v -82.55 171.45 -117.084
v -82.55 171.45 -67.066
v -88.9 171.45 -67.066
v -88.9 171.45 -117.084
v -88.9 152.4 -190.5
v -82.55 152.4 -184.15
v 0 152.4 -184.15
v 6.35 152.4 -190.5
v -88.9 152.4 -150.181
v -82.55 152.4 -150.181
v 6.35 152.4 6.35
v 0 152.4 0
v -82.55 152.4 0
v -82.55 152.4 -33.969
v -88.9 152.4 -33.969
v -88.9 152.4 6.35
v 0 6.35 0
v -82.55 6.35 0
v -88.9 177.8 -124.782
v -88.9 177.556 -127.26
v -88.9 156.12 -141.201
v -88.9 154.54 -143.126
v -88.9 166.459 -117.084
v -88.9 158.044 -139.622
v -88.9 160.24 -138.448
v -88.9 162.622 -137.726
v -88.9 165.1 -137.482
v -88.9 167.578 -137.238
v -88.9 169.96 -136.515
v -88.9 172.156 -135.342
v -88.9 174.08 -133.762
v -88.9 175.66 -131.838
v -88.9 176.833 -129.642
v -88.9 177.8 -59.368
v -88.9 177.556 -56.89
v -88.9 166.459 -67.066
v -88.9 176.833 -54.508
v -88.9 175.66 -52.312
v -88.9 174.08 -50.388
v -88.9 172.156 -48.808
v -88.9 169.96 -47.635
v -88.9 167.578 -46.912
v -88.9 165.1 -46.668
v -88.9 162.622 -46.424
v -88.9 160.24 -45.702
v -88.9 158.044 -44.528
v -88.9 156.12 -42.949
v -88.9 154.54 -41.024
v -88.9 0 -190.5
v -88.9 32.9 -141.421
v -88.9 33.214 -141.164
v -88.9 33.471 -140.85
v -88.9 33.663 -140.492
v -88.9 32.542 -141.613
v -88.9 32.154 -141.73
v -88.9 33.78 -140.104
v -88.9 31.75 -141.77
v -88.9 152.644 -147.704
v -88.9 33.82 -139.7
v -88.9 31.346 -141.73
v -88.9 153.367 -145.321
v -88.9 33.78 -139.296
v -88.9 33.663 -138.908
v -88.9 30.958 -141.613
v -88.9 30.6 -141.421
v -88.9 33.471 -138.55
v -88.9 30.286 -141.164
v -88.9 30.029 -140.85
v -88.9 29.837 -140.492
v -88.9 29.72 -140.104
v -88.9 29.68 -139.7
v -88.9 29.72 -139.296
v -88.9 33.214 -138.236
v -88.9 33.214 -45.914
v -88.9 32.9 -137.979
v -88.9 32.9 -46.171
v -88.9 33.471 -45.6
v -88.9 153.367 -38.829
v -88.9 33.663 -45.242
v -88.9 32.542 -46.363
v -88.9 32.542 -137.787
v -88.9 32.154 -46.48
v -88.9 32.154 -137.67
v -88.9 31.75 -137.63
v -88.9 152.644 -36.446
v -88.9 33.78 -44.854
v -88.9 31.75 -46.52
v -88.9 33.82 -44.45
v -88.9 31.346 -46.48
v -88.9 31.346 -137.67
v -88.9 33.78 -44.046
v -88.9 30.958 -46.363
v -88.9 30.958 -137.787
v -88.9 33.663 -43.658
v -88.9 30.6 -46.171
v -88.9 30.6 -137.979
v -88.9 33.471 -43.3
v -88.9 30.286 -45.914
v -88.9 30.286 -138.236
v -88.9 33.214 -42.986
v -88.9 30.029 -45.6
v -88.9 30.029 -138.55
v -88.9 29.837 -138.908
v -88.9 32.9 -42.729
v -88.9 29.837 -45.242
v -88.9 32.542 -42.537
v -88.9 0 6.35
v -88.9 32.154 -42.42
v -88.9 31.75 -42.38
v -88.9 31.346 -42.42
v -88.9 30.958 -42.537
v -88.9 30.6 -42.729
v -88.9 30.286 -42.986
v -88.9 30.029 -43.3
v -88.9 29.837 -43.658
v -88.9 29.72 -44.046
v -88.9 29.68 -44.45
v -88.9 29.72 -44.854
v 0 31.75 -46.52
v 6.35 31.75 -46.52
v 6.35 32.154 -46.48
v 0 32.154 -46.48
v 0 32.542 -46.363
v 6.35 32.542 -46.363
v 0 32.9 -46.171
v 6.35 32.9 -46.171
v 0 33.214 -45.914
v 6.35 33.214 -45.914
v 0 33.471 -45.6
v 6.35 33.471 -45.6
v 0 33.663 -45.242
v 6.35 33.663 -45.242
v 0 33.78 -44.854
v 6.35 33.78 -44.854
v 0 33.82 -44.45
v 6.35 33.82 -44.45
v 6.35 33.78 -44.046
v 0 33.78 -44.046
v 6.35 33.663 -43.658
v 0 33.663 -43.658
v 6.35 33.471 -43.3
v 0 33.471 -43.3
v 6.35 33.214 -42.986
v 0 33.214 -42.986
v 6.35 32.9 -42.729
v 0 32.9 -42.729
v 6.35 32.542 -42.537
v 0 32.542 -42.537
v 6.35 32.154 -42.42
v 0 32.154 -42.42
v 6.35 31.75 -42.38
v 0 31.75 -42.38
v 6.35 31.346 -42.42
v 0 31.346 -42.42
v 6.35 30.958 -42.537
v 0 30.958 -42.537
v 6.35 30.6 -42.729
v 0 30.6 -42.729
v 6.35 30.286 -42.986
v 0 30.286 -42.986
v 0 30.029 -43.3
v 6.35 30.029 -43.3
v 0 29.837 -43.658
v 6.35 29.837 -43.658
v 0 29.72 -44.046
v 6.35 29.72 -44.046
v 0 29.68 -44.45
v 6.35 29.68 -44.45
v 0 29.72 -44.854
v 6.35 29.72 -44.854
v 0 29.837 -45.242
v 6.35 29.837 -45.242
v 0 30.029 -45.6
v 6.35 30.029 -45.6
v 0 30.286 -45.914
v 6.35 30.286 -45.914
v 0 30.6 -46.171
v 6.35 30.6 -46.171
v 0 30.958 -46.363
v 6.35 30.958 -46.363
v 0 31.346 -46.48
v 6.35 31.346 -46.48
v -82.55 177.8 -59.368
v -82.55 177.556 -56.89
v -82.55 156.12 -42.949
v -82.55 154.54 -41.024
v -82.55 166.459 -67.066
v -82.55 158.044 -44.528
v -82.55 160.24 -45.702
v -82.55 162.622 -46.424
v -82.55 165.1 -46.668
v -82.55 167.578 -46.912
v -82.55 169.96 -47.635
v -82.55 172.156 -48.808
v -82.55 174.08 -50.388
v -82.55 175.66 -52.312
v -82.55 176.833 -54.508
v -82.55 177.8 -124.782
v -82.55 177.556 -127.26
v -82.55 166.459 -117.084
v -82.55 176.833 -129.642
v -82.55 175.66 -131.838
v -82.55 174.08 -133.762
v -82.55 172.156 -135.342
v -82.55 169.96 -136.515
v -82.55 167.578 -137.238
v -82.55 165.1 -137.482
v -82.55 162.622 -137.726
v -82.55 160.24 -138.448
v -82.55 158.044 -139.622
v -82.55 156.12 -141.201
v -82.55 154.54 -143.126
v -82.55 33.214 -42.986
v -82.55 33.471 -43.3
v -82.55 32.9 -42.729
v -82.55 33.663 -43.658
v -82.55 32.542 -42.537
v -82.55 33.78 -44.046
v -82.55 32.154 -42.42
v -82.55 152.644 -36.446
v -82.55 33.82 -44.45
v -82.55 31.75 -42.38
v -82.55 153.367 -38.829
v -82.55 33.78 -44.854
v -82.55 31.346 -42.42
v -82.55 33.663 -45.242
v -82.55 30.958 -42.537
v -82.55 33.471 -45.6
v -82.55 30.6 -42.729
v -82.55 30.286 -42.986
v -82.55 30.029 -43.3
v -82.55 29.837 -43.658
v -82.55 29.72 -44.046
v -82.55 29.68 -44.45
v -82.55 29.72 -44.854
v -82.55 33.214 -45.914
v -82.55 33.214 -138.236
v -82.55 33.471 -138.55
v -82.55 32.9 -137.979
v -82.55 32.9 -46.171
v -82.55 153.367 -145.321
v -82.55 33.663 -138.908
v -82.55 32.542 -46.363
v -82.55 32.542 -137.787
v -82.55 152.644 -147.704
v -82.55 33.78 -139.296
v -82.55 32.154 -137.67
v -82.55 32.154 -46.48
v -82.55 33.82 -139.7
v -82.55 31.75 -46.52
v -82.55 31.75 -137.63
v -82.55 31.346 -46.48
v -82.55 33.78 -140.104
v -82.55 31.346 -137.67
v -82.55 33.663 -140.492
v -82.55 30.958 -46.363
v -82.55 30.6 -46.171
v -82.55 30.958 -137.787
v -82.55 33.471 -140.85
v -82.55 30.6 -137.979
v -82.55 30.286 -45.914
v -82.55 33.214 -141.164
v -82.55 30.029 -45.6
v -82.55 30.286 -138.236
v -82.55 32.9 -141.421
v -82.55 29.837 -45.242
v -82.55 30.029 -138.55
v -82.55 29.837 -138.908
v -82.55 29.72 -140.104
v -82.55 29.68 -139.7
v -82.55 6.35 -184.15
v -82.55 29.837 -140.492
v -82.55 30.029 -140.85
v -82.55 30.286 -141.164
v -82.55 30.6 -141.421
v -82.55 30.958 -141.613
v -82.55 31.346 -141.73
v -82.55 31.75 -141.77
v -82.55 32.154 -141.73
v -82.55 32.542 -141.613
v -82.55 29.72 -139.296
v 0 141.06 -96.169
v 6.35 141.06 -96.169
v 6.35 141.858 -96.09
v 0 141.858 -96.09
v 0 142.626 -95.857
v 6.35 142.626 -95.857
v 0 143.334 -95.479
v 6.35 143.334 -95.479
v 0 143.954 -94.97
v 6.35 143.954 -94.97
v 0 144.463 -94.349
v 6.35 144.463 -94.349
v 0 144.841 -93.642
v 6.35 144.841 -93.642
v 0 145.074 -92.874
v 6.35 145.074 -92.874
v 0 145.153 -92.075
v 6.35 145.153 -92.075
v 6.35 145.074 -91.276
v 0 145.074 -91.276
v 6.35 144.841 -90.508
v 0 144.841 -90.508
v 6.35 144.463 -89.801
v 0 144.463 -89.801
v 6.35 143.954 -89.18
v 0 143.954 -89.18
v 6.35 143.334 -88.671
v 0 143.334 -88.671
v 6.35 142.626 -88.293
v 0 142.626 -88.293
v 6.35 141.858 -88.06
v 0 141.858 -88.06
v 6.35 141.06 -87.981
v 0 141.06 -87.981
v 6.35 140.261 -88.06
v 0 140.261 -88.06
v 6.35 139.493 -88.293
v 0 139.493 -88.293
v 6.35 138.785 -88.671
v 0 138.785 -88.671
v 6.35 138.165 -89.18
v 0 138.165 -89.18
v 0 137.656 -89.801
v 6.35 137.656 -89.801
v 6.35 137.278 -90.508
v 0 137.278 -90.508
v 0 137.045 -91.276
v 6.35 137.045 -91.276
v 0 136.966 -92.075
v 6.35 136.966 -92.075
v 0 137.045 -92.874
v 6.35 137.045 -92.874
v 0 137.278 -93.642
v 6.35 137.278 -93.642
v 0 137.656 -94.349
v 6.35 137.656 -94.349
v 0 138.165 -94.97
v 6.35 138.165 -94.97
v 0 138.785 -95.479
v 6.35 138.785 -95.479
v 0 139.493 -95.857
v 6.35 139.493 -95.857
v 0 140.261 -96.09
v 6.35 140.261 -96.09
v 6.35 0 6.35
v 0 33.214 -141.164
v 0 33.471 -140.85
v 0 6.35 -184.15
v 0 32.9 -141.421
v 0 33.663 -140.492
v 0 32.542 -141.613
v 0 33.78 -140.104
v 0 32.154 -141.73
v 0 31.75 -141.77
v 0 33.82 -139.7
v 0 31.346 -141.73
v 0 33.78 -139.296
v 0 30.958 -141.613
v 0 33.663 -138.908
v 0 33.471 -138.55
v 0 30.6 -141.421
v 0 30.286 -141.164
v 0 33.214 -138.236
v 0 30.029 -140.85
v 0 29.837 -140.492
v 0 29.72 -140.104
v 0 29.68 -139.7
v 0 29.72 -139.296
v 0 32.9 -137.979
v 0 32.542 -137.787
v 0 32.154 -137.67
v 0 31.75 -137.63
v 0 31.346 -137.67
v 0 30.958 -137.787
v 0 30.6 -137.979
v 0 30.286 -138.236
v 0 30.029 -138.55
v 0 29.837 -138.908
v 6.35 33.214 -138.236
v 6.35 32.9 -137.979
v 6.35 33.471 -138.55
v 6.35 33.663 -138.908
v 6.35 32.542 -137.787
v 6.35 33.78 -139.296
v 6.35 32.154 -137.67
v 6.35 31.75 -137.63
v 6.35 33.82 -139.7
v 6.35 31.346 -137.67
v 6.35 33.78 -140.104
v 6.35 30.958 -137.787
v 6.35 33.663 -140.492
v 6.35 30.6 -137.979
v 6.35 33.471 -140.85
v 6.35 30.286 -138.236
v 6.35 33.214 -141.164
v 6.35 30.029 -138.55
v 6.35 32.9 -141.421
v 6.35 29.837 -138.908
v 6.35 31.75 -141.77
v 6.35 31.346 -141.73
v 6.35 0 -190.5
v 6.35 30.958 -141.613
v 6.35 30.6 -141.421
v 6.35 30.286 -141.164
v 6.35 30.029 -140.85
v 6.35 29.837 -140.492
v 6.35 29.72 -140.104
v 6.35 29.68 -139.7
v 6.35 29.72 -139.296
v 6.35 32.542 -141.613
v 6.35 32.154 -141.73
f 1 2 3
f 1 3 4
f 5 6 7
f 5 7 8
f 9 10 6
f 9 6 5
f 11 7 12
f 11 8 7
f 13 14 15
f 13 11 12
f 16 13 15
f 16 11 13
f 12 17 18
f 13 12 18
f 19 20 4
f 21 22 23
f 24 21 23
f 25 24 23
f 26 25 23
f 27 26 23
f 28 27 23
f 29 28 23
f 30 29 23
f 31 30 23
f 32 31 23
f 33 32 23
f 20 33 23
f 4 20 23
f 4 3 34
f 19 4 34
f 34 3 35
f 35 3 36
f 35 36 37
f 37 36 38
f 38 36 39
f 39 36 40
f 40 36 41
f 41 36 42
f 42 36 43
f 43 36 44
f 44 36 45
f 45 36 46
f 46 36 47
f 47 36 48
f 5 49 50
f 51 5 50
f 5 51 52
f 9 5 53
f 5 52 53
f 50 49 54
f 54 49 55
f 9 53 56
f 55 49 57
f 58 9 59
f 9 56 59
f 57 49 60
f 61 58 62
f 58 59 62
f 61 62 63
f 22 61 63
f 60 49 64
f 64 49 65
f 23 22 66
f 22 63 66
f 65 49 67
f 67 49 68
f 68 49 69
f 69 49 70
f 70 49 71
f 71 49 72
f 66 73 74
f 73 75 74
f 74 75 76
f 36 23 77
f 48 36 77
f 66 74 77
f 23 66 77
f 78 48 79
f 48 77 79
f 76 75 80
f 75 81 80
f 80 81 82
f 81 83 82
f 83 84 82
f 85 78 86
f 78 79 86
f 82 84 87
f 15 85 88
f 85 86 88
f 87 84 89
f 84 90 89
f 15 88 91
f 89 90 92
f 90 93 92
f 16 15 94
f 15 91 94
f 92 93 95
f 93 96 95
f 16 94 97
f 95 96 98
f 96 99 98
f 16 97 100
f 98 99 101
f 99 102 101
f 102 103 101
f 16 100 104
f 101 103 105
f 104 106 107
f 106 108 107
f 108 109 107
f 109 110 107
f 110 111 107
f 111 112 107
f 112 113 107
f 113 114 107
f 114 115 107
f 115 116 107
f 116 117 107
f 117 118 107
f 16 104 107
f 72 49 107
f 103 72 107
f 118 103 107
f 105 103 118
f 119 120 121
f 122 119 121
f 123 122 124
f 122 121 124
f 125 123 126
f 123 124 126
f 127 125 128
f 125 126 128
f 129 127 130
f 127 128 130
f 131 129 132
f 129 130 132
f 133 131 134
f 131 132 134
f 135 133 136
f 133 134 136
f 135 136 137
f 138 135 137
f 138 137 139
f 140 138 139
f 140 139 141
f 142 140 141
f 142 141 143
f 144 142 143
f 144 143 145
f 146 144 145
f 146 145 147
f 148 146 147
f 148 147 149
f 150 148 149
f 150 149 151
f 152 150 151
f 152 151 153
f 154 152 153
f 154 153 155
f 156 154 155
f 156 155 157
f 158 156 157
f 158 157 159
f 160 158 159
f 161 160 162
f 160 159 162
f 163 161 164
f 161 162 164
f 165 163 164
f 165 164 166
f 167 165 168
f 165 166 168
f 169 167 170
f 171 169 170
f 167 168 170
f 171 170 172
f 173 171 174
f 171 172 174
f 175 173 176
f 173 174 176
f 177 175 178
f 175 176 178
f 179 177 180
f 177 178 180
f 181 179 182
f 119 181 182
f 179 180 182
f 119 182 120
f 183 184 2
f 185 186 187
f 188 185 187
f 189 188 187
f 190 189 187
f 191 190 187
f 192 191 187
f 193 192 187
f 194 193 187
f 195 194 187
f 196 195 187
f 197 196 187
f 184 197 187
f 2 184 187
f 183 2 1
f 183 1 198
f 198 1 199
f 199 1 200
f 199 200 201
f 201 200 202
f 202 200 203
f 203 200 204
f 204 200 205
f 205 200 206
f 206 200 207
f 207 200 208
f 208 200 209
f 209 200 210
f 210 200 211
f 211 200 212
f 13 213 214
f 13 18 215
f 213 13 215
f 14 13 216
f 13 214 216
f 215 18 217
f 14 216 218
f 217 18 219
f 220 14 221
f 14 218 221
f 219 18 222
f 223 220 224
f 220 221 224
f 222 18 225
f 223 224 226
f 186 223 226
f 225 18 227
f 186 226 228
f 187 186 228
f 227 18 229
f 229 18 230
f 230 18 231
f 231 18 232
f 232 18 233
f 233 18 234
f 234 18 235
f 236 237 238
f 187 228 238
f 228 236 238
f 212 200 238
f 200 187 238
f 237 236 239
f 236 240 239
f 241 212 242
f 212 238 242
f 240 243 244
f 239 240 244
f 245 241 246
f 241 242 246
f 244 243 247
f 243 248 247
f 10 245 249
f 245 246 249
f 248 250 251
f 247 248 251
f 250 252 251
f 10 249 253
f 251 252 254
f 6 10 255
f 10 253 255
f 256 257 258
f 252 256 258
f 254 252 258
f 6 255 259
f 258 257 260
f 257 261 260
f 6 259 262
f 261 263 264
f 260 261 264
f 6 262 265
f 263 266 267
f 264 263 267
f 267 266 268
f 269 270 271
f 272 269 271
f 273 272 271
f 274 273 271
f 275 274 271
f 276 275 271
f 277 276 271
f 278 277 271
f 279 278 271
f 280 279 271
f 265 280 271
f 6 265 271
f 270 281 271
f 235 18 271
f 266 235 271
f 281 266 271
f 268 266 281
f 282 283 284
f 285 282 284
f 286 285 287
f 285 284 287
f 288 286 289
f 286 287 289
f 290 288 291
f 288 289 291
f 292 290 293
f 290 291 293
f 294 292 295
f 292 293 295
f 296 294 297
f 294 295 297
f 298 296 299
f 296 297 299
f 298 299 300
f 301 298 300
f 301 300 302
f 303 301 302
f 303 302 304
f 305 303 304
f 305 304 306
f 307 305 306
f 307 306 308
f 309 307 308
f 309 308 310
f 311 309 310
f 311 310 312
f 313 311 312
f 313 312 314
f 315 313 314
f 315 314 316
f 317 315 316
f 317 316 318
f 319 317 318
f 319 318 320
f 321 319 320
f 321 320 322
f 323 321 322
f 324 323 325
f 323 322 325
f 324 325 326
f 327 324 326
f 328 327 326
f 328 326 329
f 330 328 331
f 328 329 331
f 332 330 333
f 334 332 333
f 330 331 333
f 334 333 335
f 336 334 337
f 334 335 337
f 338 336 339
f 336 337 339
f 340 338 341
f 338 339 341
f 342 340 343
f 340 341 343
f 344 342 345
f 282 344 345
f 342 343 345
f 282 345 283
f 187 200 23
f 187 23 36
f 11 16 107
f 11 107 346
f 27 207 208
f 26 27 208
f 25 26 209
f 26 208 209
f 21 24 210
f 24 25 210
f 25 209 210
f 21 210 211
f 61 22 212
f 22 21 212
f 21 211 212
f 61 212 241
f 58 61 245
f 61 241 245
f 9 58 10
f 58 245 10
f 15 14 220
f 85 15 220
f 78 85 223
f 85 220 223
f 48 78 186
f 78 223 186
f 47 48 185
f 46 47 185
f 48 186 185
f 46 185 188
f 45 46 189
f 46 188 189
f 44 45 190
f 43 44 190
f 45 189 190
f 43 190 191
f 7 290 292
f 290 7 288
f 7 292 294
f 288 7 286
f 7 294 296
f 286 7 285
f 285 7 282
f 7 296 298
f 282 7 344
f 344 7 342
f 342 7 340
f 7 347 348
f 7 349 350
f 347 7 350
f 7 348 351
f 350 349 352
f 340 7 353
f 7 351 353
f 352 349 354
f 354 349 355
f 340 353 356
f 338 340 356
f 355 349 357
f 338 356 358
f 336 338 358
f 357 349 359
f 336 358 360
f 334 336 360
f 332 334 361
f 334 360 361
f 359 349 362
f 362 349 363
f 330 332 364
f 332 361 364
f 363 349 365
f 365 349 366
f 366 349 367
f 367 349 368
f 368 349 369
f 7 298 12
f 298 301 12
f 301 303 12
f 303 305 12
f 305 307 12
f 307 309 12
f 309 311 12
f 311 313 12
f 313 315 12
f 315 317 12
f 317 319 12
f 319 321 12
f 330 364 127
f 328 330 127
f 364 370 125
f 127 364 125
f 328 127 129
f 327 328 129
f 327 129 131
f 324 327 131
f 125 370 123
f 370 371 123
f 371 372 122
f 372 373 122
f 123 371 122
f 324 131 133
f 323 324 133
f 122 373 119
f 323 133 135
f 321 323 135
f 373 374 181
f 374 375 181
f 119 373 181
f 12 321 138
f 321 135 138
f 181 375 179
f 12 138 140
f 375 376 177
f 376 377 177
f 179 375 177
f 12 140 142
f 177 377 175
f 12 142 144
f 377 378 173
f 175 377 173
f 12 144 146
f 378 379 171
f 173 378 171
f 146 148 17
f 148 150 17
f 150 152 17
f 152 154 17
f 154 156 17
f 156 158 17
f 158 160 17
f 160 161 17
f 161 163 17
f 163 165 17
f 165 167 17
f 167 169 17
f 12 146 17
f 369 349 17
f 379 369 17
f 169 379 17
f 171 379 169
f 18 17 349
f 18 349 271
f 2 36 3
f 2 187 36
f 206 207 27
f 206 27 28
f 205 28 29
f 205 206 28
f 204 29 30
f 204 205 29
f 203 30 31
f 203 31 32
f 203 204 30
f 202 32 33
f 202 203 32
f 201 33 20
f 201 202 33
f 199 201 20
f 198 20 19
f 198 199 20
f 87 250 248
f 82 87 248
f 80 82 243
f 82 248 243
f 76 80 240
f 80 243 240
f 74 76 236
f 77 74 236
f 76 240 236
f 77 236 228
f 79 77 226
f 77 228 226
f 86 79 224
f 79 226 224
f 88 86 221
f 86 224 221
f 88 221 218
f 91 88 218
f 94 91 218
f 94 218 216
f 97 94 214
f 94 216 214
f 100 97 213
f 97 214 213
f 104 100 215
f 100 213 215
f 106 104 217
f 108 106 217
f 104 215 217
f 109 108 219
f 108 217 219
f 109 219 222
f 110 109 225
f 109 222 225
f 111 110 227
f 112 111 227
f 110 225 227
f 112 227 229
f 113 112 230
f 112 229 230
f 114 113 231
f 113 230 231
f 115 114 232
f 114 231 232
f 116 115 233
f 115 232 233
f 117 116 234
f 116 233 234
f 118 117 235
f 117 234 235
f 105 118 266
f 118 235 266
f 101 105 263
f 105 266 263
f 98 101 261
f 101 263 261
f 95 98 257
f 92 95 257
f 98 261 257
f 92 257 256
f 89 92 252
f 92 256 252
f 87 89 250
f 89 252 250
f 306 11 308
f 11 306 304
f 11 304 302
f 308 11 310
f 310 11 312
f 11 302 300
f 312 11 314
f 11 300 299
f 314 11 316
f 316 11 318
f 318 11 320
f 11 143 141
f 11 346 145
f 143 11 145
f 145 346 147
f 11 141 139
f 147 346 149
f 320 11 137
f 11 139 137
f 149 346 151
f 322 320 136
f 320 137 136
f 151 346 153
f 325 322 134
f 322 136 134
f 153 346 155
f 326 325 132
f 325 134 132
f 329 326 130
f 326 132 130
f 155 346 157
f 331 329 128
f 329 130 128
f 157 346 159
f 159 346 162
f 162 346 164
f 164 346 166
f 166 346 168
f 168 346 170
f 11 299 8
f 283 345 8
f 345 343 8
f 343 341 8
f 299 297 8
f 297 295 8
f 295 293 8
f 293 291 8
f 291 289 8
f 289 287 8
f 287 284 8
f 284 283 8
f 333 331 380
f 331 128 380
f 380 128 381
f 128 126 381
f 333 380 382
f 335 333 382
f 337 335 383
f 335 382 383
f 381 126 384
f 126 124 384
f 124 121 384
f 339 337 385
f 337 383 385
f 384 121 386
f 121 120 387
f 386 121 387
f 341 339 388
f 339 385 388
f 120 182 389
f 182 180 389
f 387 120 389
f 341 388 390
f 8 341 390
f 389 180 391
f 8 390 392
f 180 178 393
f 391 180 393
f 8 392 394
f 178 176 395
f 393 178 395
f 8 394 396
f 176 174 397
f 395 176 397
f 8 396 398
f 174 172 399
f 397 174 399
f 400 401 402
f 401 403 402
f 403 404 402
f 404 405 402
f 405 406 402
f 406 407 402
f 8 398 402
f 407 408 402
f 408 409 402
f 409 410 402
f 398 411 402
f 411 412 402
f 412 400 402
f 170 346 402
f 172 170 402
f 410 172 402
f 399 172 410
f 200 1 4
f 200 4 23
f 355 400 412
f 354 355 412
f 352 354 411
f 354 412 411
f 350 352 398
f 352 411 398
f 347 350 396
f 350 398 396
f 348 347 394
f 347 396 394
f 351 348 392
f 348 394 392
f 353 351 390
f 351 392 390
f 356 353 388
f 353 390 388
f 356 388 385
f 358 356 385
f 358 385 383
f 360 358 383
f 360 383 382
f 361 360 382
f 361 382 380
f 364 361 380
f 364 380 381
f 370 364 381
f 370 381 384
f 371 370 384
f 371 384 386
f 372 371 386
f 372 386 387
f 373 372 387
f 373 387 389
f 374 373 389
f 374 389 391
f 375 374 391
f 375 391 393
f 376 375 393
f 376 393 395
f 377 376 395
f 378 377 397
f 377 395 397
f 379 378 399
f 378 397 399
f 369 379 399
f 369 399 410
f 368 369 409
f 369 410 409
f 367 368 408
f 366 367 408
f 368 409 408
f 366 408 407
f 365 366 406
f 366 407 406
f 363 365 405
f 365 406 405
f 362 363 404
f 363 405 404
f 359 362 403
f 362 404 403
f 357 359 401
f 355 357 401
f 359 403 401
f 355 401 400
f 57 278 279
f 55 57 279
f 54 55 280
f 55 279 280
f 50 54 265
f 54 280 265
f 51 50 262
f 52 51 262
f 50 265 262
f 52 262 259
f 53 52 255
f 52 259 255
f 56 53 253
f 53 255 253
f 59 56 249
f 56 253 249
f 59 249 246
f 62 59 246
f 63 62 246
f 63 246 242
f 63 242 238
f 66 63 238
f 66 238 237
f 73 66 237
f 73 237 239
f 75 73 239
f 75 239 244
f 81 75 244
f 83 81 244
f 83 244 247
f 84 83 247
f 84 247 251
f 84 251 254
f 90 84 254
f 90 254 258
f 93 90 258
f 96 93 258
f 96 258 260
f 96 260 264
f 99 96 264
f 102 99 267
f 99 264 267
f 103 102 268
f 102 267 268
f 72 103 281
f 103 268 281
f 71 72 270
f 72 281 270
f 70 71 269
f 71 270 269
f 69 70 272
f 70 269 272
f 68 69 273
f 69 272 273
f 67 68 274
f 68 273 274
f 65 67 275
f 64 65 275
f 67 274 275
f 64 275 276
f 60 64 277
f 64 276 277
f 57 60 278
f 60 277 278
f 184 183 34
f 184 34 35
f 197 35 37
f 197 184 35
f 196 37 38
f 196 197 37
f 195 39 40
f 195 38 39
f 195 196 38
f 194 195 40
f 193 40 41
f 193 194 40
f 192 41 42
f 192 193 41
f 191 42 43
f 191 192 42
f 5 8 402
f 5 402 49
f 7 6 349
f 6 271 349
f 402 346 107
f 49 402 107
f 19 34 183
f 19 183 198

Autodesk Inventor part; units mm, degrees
ref_plane "YZ Plane" through (0, 0, 0) normal (1, 0, 0) x (0, 1, 0)
ref_plane "XZ Plane" through (0, 0, 0) normal (0, 1, 0) x (-1, 0, 0)
ref_plane "XY Plane" through (0, 0, 0) normal (0, 0, 1) x (1, 0, 0)
sketch "Sketch1" plane through (0, 0, 0) normal (0, 1, 0) x (-1, 0, 0)
  line L0 (0, 0) -> (82.55, 0)
  line L1 (82.55, 0) -> (82.55, -184.15)
  line L2 (82.55, -184.15) -> (0, -184.15)
  line L3 (0, -184.15) -> (0, 0)
  line L4 (88.9, -190.5) -> (88.9, 6.35)
  line L5 (88.9, 6.35) -> (-6.35, 6.35)
  line L6 (-6.35, 6.35) -> (-6.35, -190.5)
  line L7 (-6.35, -190.5) -> (88.9, -190.5)
  dimension "d0" = 184.15
  dimension "d1" = 82.55
  dimension "d2" = 6.35
extrude "Extrusion1" add sketch "Sketch1" along normal blind 6.35 contours L0 L1 L2 L3
extrude "Extrusion2" add sketch "Sketch1" along normal blind 152.4
sketch "Sketch2" plane through (-88.9, 0, -190.5) normal (-1, 0, 0) x (0, 0, 1)
  line L0 (53.0182, 127) -> (143.8318, 127)
  line L1 (143.8318, 127) -> (143.8318, 177.8)
  line L2 (143.8318, 177.8) -> (53.0182, 177.8)
  line L3 (53.0182, 177.8) -> (53.0182, 127)
  line L4 (190.5, 152.4) -> (6.35, 152.4) projected
  line L5 (53.0182, 127) -> (143.8318, 177.8) construction
  line L6 (143.8318, 127) -> (53.0182, 177.8) construction
  point P0 (190.5, 0)
  point P1 (98.425, 152.4)
  point P2 (53.0182, 152.4)
  point P3 (143.8318, 152.4)
  dimension "d14" = 25.4
extrude "Extrusion3" add sketch "Sketch2" against normal blind 6.35 contours L3 L2 L1 L4
fillet "Fillet1" radius 12.7 4 edges at (-85.725, 177.8, -46.6682) (-85.725, 152.4, -46.6682) (-85.725, 177.8, -137.4818) (-85.725, 152.4, -137.4818)
sketch "Sketch3" plane through (-82.55, 6.35, 0) normal (1, 0, 0) x (0, 0, -1)
  line L0 (124.7818, 171.45) -> (59.3682, 171.45) projected
  line L1 (92.075, 171.45) -> (92.075, 193.6256)
  line L2 (67.0657, 165.1) -> (117.0843, 165.1)
  line L3 (117.0843, 165.1) -> (117.0843, 160.109)
  line L4 (117.0843, 160.109) -> (67.0657, 160.109)
  line L5 (67.0657, 160.109) -> (67.0657, 165.1)
  line L6 (67.0657, 165.1) -> (117.0843, 160.109) construction
  line L7 (117.0843, 165.1) -> (67.0657, 160.109) construction
  point P0 (0, -6.35)
  point P1 (92.075, 162.6045)
  dimension "d15" = 6.35
extrude "Extrusion4" cut sketch "Sketch3" against normal blind 6.35
sketch "Sketch4" plane through (6.35, 0, 6.35) normal (1, 0, 0) x (0, 0, -1)
  line L0 (0, 152.4) -> (196.85, 152.4) projected
  line L1 (98.425, 152.4) -> (98.425, 129.719)
  circle A0 centre (98.425, 141.0595) radius 4.0936
  point P0 (6.35, 0)
extrude "Extrusion5" cut sketch "Sketch4" against normal up to surface (6.35 mm away)
sketch "Sketch5" plane through (6.35, 0, 6.35) normal (1, 0, 0) x (0, 0, -1)
  line L0 (196.85, 0) -> (196.85, 152.4) projected
  line L1 (0, 0) -> (196.85, 0)
  line L2 (196.85, 0) -> (196.85, 31.75)
  line L3 (196.85, 31.75) -> (0, 31.75)
  line L4 (0, 31.75) -> (0, 0)
  line L5 (0, 31.75) -> (62.6052, 31.75)
  line L6 (0, 31.75) -> (50.8, 31.75)
  line L7 (196.85, 31.75) -> (146.05, 31.75)
  circle A0 centre (50.8, 31.75) radius 2.0701
  circle A1 centre (146.05, 31.75) radius 2.0701
  point P0 (6.35, 0)
  dimension "d16" = 31.75
  dimension "d17" = 50.8
  dimension "d18" = 50.8
  dimension "d19" = 4.1402
  dimension "d20" = 4.1402
extrude "Extrusion6" cut sketch "Sketch5" against normal through all contours A1 L3 | L3 A1 | A0 L3 | L3 A0
properties material "Polycarbonate, Clear"
